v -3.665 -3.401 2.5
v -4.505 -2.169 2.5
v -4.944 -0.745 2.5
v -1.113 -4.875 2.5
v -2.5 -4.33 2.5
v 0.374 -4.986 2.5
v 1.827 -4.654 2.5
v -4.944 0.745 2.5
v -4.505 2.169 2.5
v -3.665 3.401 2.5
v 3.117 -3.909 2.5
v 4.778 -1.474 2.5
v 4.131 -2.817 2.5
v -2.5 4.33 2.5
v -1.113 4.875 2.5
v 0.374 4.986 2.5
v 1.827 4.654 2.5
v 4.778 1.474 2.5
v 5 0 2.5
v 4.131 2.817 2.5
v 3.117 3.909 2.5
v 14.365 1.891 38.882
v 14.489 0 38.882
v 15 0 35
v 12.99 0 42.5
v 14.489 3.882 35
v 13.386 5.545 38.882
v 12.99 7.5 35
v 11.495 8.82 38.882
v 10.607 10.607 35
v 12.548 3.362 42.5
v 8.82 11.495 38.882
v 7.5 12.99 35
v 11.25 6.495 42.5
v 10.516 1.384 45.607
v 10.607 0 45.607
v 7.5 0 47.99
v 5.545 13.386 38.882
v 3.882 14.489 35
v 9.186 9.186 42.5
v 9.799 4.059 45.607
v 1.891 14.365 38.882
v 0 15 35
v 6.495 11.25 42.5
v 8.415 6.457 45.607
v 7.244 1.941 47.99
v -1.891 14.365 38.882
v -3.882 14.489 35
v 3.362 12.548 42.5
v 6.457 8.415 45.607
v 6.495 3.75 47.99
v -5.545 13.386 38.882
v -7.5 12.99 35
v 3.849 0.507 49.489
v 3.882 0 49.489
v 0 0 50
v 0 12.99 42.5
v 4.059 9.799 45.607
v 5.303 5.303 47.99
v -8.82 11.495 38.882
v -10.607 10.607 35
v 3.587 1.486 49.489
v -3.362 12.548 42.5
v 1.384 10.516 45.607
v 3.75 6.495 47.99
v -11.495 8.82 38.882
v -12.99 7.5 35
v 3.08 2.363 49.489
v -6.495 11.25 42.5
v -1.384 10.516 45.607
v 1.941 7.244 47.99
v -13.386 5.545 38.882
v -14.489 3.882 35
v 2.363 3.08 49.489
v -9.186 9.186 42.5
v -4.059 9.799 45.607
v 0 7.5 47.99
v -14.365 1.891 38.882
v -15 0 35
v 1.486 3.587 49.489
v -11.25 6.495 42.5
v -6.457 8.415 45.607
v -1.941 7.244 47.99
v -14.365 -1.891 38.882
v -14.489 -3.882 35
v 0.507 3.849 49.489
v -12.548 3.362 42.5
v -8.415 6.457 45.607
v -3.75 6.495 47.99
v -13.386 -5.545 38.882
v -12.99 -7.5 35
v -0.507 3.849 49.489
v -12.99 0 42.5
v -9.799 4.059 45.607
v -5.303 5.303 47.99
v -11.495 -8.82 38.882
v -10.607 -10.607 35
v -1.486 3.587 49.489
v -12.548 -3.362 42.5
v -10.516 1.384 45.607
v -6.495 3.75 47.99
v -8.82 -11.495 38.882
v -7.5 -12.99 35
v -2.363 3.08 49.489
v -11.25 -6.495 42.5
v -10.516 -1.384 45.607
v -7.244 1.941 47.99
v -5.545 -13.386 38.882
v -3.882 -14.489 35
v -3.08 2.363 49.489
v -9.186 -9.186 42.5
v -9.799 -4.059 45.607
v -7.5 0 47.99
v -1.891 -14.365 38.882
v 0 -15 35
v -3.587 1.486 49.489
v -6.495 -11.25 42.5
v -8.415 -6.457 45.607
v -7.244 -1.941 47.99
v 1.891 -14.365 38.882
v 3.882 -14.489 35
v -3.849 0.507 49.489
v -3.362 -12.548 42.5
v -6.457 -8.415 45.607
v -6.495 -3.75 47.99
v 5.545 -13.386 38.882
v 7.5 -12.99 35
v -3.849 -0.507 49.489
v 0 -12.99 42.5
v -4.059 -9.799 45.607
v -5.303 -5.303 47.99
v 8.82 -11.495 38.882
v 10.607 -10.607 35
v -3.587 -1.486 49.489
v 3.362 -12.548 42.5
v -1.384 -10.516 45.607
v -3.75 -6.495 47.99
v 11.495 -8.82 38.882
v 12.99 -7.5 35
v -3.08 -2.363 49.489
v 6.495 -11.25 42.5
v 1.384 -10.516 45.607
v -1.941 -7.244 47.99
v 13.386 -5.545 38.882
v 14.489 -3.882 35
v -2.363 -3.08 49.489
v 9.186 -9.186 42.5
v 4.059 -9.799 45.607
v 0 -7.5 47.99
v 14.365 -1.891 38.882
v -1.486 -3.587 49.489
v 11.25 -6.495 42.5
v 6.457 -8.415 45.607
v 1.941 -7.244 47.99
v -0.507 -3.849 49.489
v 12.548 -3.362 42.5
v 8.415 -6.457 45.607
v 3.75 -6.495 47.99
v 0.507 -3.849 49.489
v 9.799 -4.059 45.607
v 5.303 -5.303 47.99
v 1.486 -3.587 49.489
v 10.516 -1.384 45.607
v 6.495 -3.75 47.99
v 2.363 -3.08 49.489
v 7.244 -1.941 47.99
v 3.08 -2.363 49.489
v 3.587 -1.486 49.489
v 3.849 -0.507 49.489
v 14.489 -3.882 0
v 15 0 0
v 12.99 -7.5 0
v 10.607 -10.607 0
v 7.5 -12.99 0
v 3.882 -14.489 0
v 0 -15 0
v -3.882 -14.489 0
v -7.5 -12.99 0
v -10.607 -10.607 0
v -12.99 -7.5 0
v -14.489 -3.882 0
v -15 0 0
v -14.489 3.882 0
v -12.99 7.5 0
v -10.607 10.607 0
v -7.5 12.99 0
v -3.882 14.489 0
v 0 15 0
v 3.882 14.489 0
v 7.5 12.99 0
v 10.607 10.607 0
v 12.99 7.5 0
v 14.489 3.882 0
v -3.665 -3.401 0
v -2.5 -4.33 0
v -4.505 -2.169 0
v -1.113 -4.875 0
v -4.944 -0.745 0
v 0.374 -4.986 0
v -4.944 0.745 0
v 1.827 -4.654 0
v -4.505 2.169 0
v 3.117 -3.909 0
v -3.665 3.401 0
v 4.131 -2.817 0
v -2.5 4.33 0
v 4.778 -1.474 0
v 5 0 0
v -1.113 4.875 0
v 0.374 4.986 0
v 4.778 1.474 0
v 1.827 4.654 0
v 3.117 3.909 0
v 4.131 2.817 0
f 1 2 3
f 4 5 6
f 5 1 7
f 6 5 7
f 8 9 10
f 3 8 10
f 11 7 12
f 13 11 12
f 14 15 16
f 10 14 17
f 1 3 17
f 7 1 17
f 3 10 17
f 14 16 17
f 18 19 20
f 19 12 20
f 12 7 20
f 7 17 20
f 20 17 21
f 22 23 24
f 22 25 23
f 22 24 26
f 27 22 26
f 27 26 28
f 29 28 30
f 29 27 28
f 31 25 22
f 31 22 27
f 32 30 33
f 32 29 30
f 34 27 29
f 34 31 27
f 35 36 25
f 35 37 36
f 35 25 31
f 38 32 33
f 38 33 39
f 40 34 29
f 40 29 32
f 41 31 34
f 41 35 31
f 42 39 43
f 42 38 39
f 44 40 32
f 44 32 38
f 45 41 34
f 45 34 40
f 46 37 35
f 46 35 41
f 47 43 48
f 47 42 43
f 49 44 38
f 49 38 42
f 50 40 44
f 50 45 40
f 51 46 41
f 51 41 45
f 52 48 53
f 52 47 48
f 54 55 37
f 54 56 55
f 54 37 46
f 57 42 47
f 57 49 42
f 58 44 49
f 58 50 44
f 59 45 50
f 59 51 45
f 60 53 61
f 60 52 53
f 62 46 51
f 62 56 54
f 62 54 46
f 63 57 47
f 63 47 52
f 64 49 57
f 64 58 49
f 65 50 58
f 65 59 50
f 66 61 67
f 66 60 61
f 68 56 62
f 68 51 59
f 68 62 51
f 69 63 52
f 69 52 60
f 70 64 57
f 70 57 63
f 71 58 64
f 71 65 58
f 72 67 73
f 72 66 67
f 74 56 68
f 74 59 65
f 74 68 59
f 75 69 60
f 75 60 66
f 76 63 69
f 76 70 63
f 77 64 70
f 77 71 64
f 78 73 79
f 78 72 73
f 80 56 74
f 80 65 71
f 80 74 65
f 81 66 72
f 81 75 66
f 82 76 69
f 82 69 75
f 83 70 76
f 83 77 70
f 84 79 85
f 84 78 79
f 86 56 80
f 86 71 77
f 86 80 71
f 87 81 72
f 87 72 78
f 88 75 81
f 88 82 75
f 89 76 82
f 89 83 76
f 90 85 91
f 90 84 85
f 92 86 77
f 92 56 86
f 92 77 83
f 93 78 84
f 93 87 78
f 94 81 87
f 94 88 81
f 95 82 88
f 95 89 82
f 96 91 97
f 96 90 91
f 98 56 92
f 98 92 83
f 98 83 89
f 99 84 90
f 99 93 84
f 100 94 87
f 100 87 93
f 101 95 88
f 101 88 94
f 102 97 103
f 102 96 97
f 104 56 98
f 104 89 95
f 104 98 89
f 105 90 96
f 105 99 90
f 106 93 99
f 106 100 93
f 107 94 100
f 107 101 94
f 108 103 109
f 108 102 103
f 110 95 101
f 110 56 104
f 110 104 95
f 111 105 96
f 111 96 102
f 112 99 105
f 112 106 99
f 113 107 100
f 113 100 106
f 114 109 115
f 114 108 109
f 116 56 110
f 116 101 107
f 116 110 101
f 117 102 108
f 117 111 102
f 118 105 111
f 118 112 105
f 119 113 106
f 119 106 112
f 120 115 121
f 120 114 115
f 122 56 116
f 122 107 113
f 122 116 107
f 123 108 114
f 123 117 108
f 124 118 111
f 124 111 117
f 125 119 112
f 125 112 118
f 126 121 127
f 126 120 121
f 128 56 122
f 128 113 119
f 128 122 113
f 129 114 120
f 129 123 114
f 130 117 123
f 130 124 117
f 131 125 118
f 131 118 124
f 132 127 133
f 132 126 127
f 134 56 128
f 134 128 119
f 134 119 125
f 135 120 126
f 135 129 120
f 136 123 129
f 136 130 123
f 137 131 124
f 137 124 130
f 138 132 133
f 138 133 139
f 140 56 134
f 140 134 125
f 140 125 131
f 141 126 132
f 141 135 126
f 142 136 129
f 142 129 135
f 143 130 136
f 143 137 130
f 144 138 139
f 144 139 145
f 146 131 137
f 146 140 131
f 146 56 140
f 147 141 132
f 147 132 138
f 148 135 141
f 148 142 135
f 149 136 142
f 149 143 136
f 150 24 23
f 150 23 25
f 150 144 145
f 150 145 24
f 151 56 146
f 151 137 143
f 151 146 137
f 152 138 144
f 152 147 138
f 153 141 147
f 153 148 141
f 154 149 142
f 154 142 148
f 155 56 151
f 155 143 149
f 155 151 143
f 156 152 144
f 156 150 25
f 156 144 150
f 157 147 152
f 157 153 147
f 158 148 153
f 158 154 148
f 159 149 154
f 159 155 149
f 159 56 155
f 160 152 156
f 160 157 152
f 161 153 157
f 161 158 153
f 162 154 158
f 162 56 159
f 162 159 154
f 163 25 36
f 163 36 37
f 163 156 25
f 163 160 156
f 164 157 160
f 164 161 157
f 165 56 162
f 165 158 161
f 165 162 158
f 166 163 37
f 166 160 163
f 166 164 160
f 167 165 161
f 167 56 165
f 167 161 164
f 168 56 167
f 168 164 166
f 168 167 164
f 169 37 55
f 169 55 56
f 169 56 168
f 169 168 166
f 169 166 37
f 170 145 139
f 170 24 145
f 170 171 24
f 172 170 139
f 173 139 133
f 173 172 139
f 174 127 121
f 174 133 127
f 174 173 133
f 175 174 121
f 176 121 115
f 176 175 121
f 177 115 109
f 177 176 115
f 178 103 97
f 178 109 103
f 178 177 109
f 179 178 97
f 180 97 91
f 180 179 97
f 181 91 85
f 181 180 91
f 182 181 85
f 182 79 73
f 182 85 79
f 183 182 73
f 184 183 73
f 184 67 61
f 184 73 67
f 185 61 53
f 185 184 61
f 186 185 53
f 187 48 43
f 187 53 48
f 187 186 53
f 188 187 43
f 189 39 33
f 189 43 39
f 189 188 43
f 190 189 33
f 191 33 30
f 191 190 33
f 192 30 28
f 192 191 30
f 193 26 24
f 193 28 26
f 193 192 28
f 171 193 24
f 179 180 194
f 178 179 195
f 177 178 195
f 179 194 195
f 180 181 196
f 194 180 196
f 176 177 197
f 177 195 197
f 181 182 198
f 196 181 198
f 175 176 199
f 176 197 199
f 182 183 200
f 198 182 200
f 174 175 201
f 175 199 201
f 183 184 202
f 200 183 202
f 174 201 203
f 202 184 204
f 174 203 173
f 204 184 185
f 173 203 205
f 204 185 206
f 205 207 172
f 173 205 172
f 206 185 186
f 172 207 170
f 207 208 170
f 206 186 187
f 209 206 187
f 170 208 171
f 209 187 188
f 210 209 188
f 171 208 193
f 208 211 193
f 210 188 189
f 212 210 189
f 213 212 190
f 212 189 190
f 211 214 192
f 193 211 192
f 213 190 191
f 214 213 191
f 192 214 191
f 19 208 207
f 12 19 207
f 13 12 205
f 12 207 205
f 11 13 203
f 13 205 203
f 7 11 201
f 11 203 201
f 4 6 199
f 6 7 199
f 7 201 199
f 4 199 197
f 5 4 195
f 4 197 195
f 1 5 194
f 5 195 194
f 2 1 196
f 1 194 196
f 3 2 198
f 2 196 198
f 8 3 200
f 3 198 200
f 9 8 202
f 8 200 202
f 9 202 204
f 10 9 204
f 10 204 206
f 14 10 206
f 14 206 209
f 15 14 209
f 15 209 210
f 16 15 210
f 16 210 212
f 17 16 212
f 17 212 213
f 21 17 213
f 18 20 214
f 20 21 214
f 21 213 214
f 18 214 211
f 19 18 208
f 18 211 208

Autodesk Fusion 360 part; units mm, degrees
sketch "Esquisse1" plane through (0, 0, 0) normal (0, 0, 1) x (1, 0, 0)
  circle A0 centre (0, 0) radius 15
  dimension "d1" = 30
extrude "Extrusion1" add sketch "Esquisse1" along normal blind 50
fillet "Congé1" radius 15 1 faces at (3.6653, 3.4009, 50)
sketch "Esquisse2" plane through (0, 0, 0) normal (0, 0, 1) x (1, 0, 0)
  circle A0 centre (0, 0) radius 5
  dimension "d6" = 10
extrude "Extrusion2" cut sketch "Esquisse2" along normal blind 2.5
